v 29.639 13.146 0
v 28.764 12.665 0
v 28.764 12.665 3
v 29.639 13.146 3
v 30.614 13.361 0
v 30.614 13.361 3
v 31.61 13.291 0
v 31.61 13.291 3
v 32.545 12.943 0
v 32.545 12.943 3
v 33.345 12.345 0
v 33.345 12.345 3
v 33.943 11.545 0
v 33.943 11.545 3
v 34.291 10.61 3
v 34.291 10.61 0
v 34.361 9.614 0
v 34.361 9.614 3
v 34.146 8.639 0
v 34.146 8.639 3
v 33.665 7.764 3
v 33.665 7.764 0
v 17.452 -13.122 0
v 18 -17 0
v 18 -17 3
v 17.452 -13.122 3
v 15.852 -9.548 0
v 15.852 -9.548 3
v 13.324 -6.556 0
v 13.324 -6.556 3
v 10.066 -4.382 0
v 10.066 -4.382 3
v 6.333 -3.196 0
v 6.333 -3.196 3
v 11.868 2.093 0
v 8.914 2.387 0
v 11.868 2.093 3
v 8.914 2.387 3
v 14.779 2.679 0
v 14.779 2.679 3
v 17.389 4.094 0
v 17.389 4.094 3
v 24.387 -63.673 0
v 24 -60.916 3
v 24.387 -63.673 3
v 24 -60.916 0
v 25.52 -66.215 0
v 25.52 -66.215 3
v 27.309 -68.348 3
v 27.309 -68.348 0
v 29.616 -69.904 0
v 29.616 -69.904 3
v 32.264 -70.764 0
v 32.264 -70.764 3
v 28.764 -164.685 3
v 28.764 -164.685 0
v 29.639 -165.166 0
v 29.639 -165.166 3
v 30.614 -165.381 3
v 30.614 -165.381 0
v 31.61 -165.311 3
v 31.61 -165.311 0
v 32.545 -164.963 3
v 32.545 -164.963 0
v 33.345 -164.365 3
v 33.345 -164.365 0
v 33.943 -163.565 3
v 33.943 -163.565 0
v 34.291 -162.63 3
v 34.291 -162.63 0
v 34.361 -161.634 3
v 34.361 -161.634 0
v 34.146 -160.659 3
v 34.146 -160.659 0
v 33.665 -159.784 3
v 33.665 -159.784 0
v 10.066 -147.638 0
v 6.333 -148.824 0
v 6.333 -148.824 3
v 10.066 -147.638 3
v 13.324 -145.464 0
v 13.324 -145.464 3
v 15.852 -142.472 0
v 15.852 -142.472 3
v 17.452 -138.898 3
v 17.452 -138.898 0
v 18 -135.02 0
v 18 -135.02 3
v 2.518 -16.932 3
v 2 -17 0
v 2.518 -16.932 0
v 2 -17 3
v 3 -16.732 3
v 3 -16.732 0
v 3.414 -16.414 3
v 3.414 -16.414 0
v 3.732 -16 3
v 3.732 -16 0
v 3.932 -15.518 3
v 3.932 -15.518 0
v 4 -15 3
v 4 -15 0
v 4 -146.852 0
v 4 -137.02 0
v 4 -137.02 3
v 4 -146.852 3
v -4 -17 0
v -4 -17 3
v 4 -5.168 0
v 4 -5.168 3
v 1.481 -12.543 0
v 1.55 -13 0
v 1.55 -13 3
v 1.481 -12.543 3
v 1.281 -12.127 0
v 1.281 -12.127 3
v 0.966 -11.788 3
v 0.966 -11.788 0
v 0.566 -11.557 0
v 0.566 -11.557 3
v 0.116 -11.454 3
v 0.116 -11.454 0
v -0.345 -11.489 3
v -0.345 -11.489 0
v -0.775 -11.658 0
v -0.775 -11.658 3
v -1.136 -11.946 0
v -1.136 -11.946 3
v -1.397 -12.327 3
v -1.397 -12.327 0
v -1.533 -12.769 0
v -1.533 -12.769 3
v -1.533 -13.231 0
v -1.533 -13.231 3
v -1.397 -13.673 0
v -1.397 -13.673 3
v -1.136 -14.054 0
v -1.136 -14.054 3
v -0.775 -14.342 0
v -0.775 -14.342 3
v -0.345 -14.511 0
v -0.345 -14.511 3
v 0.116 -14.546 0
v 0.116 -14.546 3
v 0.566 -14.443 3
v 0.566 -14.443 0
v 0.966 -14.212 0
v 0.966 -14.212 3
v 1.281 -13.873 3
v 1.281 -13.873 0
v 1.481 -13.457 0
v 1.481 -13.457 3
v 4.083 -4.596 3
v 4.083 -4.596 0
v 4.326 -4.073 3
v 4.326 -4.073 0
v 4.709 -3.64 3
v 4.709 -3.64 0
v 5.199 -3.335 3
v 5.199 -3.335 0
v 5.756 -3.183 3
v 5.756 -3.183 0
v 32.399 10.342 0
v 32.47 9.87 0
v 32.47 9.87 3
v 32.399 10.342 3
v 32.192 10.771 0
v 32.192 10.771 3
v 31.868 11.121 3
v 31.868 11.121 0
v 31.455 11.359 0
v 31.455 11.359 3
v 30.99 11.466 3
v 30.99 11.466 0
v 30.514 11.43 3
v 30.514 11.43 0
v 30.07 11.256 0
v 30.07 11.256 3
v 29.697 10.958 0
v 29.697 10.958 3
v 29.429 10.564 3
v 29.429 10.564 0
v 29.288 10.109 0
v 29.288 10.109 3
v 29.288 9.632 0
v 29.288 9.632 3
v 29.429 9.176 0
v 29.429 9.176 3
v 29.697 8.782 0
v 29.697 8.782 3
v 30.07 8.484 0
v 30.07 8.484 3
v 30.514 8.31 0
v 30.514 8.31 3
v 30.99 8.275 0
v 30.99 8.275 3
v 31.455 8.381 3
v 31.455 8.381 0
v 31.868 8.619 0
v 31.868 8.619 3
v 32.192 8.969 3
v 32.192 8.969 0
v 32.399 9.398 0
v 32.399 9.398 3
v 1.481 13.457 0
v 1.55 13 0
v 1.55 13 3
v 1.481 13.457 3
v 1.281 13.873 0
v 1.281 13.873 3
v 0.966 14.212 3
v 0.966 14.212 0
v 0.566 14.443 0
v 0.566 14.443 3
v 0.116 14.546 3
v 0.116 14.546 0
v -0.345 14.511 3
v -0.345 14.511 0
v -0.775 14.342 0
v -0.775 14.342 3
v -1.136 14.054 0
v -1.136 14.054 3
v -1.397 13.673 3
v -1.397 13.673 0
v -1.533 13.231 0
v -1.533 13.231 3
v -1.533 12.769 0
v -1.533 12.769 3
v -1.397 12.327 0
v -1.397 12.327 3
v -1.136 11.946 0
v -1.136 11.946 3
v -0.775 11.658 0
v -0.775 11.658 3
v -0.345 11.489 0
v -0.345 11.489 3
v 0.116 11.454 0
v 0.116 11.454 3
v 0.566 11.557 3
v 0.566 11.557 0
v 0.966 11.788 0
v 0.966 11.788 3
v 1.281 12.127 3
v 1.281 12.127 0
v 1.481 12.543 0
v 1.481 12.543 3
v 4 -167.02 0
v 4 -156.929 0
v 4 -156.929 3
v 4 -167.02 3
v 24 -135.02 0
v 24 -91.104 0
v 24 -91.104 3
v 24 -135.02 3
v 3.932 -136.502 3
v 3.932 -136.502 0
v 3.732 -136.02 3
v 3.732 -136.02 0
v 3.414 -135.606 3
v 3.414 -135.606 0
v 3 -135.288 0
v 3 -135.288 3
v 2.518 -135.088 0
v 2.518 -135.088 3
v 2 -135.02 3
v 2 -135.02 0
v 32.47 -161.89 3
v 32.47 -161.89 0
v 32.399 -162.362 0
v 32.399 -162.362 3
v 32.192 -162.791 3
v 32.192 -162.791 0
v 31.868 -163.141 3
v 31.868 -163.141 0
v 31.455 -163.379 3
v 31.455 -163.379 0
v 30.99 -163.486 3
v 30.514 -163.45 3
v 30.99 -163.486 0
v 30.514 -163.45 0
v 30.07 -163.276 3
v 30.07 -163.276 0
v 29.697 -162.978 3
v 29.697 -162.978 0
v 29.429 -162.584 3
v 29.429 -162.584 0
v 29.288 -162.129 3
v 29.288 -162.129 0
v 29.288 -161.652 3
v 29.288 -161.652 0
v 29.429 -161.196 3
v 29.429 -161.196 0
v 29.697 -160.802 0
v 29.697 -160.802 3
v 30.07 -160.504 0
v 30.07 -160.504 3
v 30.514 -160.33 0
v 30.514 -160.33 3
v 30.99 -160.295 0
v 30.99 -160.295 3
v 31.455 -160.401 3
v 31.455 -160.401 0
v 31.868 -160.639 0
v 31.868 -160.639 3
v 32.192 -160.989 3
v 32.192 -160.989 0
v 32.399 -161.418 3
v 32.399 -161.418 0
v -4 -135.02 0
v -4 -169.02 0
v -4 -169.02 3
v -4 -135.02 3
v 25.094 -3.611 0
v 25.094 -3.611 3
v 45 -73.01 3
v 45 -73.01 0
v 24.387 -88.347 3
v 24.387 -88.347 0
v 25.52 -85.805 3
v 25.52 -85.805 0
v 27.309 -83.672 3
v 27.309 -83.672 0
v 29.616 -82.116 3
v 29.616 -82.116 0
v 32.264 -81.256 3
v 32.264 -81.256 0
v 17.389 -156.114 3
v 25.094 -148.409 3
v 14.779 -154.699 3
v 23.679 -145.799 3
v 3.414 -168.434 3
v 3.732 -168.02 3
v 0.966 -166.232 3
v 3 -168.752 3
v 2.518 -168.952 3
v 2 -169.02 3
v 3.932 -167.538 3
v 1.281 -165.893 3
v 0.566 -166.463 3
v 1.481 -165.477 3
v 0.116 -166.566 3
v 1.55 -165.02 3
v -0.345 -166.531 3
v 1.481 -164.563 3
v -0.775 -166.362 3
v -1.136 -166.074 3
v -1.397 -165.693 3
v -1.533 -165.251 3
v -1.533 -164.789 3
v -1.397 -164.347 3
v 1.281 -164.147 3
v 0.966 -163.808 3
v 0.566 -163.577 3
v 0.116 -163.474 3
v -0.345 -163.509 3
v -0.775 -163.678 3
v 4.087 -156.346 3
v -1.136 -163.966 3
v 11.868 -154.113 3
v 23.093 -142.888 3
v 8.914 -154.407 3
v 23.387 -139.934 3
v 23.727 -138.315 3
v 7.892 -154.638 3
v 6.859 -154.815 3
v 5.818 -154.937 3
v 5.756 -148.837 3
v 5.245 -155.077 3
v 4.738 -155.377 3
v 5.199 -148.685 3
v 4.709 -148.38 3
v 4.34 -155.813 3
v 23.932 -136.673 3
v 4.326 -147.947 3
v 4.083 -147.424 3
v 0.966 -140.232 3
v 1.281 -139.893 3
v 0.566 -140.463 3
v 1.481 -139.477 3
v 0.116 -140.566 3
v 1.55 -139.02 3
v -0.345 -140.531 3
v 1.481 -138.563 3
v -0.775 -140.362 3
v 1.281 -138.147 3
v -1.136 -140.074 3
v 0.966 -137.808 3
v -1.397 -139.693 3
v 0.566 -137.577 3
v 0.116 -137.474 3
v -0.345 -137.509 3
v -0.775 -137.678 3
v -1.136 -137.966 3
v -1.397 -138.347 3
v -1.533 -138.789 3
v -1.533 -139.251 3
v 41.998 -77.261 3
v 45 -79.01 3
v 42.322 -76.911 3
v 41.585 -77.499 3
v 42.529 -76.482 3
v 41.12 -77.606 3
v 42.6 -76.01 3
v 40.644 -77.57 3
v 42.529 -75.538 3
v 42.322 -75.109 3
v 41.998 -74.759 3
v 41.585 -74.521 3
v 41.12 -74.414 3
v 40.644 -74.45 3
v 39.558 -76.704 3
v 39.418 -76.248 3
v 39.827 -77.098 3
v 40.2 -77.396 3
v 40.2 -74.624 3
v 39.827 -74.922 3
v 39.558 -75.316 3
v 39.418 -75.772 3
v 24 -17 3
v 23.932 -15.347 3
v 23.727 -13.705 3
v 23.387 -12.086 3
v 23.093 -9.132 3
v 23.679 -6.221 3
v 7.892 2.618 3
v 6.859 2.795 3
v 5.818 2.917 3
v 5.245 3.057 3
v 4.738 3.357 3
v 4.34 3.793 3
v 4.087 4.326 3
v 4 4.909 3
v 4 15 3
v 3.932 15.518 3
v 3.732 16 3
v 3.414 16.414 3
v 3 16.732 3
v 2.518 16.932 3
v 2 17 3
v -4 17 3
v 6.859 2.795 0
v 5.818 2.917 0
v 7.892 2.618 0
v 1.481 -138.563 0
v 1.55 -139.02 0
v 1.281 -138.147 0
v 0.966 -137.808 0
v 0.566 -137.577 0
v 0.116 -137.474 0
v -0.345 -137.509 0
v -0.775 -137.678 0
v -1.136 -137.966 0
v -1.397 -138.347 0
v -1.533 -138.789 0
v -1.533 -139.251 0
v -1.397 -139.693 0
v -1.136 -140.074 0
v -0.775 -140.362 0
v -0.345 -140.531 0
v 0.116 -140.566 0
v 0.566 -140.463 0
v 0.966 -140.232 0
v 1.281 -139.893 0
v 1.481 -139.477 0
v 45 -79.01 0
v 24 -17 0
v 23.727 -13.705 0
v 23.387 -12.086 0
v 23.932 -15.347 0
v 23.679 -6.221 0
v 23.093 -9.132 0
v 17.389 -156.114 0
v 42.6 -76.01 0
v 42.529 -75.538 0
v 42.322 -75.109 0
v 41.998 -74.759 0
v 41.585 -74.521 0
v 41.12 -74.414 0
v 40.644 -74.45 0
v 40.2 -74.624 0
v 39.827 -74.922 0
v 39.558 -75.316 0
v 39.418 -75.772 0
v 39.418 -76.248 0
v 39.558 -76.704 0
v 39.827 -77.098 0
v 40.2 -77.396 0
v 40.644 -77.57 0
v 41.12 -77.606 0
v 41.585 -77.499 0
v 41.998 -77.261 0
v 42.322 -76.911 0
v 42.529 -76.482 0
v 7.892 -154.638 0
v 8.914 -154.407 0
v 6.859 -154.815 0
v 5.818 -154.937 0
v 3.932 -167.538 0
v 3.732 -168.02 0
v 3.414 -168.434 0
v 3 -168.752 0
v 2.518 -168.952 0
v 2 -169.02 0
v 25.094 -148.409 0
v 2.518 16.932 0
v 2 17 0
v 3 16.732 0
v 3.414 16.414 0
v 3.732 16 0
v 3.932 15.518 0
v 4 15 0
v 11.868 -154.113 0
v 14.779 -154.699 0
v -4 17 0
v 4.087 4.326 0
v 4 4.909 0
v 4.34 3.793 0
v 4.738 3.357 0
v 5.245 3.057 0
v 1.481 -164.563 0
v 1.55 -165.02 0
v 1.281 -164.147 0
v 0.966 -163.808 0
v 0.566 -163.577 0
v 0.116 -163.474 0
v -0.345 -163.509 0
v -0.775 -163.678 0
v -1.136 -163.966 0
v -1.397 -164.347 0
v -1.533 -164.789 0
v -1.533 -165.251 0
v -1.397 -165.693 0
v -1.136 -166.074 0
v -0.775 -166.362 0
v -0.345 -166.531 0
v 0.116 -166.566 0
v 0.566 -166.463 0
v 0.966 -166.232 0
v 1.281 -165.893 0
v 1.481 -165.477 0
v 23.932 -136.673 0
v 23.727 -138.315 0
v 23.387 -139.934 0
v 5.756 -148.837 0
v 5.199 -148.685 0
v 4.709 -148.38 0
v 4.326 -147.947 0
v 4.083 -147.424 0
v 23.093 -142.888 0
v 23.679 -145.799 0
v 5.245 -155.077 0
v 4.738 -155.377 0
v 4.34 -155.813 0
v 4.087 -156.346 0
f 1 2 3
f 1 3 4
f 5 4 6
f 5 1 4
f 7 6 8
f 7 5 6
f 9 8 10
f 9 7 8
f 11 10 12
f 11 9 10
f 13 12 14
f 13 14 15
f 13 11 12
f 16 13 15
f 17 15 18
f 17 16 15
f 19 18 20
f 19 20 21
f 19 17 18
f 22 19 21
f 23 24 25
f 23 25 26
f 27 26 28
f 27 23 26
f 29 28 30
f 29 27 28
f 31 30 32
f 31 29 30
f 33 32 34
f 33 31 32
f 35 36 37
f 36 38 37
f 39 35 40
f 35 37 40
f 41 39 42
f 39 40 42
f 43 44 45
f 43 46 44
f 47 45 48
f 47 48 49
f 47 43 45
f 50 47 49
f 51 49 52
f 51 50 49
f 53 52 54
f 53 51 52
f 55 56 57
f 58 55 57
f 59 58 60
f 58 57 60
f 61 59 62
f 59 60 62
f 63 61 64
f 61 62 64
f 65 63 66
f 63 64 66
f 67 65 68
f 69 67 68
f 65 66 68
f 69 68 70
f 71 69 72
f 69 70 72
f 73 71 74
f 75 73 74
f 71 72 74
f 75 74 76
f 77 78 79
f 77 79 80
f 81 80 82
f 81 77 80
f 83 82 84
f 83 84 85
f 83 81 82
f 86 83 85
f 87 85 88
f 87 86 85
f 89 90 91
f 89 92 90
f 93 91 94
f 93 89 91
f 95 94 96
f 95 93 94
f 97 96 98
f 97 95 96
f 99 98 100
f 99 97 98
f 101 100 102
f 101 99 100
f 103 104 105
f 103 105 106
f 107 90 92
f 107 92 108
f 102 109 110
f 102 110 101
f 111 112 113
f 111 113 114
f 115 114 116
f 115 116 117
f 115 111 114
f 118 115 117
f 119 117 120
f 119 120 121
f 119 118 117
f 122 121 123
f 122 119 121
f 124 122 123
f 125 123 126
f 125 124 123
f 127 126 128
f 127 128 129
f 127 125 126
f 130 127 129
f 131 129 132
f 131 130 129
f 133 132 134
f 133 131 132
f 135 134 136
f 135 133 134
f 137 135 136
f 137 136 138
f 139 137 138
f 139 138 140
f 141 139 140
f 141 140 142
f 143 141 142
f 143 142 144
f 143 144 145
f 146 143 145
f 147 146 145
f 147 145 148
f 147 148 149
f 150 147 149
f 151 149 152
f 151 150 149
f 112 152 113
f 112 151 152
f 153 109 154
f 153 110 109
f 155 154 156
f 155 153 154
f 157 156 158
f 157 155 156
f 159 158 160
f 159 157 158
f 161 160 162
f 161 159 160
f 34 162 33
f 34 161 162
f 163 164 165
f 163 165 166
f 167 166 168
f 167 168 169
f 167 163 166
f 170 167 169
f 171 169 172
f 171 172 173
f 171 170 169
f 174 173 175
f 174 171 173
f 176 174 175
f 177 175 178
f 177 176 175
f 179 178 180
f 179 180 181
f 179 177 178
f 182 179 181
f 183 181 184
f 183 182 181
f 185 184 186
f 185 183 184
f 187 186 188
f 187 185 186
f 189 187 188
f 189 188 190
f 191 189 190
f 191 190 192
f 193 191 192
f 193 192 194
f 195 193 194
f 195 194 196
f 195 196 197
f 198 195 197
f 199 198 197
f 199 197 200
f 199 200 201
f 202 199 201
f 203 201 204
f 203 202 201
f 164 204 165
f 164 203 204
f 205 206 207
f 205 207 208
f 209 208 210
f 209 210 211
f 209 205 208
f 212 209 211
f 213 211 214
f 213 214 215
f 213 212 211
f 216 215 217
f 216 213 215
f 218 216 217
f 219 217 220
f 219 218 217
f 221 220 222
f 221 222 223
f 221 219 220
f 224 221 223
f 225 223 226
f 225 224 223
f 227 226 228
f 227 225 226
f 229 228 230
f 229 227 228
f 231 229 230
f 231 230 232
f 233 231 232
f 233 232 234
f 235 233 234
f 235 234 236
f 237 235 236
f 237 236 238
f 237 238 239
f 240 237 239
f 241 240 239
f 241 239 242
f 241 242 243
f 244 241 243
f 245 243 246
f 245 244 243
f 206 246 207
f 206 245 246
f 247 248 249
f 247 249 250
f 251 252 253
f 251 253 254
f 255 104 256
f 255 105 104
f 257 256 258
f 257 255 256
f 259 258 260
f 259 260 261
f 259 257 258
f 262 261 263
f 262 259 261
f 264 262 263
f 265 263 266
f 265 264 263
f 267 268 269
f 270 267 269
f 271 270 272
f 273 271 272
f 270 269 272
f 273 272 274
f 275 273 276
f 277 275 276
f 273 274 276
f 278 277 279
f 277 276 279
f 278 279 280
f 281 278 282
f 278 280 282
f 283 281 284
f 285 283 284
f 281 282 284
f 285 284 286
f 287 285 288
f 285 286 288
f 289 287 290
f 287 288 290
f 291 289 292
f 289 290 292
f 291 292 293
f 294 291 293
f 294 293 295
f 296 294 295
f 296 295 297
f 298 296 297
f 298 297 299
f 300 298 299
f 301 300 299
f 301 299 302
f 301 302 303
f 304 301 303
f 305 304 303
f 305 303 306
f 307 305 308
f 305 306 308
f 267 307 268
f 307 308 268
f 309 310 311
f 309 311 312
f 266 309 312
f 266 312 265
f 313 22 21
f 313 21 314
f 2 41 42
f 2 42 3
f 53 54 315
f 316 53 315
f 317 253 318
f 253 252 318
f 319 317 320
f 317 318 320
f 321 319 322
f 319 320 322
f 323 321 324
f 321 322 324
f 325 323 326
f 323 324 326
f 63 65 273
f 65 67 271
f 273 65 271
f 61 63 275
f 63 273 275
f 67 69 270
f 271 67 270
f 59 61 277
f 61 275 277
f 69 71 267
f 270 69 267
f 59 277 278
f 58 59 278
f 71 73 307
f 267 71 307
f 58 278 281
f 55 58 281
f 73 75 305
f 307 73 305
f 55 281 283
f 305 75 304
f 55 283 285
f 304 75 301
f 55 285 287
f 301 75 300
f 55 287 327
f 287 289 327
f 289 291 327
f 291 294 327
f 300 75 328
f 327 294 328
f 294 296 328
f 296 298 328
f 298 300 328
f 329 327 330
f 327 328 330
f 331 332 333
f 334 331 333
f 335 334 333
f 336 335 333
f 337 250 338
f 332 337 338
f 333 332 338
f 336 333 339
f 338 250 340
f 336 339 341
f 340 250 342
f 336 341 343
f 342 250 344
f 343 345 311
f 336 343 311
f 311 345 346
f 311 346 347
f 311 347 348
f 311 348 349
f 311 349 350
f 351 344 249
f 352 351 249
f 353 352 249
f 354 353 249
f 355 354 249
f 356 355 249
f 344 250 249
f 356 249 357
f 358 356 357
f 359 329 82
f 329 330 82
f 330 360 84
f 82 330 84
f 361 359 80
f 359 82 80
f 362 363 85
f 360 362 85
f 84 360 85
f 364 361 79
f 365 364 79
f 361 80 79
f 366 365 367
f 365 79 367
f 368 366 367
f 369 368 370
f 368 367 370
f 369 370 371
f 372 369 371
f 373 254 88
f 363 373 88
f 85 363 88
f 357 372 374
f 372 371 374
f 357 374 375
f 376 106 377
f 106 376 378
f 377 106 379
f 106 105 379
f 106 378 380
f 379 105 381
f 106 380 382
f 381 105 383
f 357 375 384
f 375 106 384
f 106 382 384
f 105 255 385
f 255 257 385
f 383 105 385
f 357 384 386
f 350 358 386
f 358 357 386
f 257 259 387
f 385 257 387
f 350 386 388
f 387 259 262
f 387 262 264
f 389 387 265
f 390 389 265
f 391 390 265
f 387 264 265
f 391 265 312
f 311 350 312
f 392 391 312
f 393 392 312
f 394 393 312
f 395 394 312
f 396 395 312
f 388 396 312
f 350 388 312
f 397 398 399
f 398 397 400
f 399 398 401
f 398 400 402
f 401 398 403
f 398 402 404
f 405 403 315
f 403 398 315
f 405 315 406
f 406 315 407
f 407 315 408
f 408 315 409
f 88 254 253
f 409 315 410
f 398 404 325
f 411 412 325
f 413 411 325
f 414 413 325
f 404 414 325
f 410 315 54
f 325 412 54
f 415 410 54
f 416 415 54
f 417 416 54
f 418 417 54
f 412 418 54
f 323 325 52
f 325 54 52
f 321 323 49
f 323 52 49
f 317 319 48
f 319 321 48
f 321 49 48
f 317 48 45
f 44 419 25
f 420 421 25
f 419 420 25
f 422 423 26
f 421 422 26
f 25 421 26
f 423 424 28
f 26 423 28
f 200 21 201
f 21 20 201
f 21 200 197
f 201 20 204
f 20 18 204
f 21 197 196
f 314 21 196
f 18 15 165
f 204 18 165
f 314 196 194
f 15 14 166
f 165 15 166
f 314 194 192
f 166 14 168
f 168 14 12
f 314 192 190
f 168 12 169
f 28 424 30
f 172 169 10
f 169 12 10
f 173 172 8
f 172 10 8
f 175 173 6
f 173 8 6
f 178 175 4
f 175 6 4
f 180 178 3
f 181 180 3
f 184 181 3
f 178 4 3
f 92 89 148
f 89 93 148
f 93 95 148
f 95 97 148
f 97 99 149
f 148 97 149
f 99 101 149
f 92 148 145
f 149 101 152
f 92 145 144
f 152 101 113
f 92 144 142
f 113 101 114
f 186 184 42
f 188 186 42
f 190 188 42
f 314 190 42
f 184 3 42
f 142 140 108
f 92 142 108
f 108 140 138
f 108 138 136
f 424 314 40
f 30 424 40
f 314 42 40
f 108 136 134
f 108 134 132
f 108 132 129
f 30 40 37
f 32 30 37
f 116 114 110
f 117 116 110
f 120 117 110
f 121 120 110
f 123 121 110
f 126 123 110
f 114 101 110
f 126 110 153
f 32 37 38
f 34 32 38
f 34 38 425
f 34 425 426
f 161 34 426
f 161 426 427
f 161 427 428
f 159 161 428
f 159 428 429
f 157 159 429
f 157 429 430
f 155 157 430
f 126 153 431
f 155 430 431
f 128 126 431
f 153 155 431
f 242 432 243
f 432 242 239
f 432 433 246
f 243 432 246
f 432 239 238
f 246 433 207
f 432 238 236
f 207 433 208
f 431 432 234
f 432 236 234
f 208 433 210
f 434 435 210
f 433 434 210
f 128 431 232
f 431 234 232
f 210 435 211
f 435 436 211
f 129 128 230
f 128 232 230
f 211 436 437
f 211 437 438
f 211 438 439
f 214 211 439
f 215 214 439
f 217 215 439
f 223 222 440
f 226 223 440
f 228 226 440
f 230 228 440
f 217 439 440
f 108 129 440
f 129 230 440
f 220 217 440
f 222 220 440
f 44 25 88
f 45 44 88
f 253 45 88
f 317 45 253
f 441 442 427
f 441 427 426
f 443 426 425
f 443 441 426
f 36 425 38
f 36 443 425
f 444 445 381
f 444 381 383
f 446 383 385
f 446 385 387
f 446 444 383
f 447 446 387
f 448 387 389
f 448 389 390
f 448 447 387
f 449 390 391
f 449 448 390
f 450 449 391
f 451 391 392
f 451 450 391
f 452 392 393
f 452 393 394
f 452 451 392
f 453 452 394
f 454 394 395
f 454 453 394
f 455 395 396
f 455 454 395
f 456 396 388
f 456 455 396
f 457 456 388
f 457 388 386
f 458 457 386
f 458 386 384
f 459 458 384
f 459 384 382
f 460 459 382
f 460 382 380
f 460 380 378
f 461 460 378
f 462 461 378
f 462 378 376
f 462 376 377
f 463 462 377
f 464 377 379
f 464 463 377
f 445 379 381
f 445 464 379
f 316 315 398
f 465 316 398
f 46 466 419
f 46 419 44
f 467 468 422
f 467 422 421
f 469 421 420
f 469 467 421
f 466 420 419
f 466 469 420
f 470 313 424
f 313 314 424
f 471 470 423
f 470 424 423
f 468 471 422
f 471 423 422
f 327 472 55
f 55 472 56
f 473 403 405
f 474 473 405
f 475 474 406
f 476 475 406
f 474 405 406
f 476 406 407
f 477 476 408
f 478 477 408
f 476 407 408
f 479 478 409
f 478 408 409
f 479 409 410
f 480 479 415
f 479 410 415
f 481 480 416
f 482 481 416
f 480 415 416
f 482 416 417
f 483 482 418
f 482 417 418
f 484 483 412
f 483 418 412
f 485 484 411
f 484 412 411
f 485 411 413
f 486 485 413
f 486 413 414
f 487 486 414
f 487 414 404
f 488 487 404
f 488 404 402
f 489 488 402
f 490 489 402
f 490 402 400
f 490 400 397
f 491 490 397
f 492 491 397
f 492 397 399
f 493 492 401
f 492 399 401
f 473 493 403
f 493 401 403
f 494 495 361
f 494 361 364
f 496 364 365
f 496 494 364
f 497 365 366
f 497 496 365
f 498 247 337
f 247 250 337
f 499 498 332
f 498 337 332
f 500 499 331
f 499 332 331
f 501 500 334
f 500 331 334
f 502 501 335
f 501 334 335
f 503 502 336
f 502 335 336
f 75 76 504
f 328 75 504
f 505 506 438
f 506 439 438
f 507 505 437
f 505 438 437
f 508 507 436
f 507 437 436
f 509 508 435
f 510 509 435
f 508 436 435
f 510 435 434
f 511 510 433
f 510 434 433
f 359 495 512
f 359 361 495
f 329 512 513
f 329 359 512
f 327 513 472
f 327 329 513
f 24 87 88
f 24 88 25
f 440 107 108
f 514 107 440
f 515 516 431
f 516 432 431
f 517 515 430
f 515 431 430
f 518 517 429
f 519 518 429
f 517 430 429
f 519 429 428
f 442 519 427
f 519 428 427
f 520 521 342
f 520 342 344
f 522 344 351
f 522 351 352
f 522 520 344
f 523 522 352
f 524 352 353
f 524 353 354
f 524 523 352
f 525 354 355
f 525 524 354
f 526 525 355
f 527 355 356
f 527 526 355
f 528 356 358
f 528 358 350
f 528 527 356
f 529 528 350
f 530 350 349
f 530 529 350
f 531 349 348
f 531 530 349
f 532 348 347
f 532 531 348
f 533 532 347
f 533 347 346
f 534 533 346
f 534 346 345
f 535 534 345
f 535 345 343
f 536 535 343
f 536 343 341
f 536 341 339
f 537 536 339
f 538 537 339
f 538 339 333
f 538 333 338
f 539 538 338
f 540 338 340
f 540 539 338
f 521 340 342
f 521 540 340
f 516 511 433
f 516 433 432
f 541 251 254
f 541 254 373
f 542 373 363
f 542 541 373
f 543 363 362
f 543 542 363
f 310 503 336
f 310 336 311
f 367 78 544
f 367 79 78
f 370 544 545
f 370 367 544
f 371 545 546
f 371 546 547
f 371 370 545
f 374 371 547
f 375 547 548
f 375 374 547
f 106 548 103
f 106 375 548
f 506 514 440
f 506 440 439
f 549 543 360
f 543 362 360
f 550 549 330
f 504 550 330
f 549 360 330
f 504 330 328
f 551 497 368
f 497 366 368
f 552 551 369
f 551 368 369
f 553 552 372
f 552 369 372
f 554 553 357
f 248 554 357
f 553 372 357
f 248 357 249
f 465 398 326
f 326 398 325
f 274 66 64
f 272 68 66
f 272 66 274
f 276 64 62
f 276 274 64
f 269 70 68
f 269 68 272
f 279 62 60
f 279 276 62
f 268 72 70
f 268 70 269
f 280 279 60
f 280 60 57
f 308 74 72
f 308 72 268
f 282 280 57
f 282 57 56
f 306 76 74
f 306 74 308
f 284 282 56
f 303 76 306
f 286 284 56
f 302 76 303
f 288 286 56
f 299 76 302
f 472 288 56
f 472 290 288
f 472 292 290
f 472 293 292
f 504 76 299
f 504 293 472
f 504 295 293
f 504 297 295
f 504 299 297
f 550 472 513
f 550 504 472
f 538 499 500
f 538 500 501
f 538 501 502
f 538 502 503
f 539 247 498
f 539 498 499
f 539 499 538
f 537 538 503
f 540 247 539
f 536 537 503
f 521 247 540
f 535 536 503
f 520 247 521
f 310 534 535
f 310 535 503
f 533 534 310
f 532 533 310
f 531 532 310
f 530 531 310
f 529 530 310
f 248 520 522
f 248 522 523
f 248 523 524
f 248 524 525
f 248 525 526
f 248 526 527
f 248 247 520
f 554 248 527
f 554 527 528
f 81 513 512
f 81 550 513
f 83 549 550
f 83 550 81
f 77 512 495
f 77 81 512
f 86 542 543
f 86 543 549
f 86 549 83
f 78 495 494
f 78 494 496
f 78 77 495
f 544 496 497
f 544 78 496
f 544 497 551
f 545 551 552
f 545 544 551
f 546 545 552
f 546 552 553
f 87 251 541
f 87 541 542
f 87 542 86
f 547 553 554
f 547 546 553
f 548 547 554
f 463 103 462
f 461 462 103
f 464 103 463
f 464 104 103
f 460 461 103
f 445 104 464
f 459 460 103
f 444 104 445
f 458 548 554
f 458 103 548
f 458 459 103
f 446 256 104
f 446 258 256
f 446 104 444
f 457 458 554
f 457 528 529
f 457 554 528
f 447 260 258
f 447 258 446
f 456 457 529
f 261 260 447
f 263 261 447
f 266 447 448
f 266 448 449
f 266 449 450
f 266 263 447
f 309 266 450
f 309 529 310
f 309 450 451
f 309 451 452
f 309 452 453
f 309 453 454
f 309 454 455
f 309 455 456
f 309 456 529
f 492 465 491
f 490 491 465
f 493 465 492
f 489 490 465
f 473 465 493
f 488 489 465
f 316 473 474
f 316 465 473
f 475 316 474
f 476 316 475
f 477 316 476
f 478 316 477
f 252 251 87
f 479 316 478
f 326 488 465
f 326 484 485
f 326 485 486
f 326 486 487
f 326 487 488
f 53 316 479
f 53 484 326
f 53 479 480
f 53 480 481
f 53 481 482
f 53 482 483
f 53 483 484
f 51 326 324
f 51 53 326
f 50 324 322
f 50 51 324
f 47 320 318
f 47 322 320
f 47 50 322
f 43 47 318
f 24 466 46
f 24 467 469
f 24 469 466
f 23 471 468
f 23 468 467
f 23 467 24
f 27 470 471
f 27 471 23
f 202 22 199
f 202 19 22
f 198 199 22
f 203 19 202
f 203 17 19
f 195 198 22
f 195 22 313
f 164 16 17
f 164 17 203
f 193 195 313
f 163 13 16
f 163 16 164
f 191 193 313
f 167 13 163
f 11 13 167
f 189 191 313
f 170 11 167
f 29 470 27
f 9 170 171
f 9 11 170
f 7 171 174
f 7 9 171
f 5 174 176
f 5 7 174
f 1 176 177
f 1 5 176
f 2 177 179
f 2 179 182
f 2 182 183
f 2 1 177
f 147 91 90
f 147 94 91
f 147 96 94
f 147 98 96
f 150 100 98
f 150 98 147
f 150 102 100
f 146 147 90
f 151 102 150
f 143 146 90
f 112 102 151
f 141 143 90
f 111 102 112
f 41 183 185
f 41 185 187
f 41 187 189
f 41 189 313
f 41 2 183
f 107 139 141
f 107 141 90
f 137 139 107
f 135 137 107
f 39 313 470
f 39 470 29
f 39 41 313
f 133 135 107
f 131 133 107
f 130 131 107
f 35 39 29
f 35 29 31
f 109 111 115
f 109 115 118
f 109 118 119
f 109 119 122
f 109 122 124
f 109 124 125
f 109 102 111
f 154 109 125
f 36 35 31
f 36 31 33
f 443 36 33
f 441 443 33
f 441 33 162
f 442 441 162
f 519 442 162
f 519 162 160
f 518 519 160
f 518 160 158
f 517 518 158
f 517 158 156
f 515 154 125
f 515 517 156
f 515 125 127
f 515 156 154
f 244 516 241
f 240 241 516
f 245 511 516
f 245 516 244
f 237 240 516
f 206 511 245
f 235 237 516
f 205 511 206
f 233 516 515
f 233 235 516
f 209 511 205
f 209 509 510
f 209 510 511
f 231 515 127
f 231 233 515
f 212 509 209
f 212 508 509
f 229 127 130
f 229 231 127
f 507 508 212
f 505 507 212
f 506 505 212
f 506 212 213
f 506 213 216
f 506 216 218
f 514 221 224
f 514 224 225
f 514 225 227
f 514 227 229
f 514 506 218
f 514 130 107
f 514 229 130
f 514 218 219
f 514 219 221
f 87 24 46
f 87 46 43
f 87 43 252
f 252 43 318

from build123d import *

# Parameters (mm, degrees)
SKETCH_1_R      = 1.55
EXTRUDE_1_DEPTH = 3
FILLET_1_R      = 2
SKETCH_2_R      = 1.6
EXTRUDE_2_DEPTH = 3
FILLET_2_R      = 10
SKETCH_4_R      = 1.6
EXTRUDE_3_DEPTH = 3
FILLET_3_R      = 10


with BuildPart() as part:
    # 草图1 → 凸台-拉伸1 (new body)
    with BuildSketch(Plane.XY):
        with BuildLine():
            Line((4, -17), (-4, -17))
            Line((-4, -17), (-4, 17))
            Line((-4, 17), (4, 17))
            Line((4, 17), (4, 3))
            ThreePointArc((4, 3), (18.142135624, -2.857864376), (24, -17))
            Line((24, -17), (24, -135.02))
            ThreePointArc((24, -135.02), (18.142135624, -149.162135624), (4, -155.02))
            Line((4, -155.02), (4, -169.02))
            Line((4, -169.02), (-4, -169.02))
            Line((-4, -169.02), (-4, -135.02))
            Line((-4, -135.02), (4, -135.02))
            Line((4, -135.02), (4, -149.02))
            ThreePointArc((4, -149.02), (13.899494937, -144.919494937), (18, -135.02))
            Line((18, -135.02), (18, -17))
            ThreePointArc((18, -17), (13.899494937, -7.100505063), (4, -3))
            Line((4, -3), (4, -17))
        make_face()
        with Locations((0, 13)):
            Circle(SKETCH_1_R, mode=Mode.SUBTRACT)
        with Locations((0, -13)):
            Circle(SKETCH_1_R, mode=Mode.SUBTRACT)
        with Locations((0, -139.02)):
            Circle(SKETCH_1_R, mode=Mode.SUBTRACT)
        with Locations((0, -165.02)):
            Circle(SKETCH_1_R, mode=Mode.SUBTRACT)
    extrude(amount=EXTRUDE_1_DEPTH)

    # 圆角1
    fillet_1_edges = [part.edges().sort_by_distance(p)[0] for p in [
        (4, -3, 1.5),
        (4, -17, 1.5),
        (4, 17, 1.5),
        (4, 3, 1.5),
        (4, -155.02, 1.5),
        (4, -169.02, 1.5),
        (4, -135.02, 1.5),
        (4, -149.02, 1.5),
    ]]
    fillet(fillet_1_edges, radius=FILLET_1_R)

    # 草图2 → 凸台-拉伸2 (add)
    with BuildSketch(Plane.XY):
        with BuildLine():
            Line((13.058826075, 0.830806772), (28.763705104, 12.66528197))
            ThreePointArc((28.763705104, 12.66528197), (33.344931419, 12.344931419), (33.66528197, 7.763705104))
            Line((33.66528197, 7.763705104), (21.830806772, -7.941173925))
            ThreePointArc((21.830806772, -7.941173925), (18.142135624, -2.857864376), (13.058826075, 0.830806772))
        make_face()
        with Locations((30.870057685, 9.870057685)):
            Circle(SKETCH_2_R, mode=Mode.SUBTRACT)
    extrude_2 = extrude(amount=EXTRUDE_2_DEPTH)

    # 镜向5: 凸台-拉伸2 across plane
    add(extrude_2.mirror(Plane.ZX.offset(-76.01)))

    # 圆角2
    fillet_2_edges = [part.edges().sort_by_distance(p)[0] for p in [
        (21.830806772, -7.941173925, 1.5),
        (13.058826075, 0.830806772, 1.5),
        (21.830806772, -144.078826075, 1.5),
        (13.058826075, -152.850806772, 1.5),
    ]]
    fillet(fillet_2_edges, radius=FILLET_2_R)

    # 草图4 → 凸台-拉伸3 (add)
    with BuildSketch(Plane.XY.offset(3)):
        Polygon((24, -69.307133405), (45, -73.01), (45, -79.01), (24, -82.712866595), align=None)
        with Locations((41, -76.01)):
            Circle(SKETCH_4_R, mode=Mode.SUBTRACT)
    extrude(amount=-EXTRUDE_3_DEPTH)

    # 圆角3
    fillet_3_edges = [part.edges().sort_by_distance(p)[0] for p in [
        (24, -69.307133405, 1.5),
        (24, -82.712866595, 1.5),
    ]]
    fillet(fillet_3_edges, radius=FILLET_3_R)


solid = part.part
